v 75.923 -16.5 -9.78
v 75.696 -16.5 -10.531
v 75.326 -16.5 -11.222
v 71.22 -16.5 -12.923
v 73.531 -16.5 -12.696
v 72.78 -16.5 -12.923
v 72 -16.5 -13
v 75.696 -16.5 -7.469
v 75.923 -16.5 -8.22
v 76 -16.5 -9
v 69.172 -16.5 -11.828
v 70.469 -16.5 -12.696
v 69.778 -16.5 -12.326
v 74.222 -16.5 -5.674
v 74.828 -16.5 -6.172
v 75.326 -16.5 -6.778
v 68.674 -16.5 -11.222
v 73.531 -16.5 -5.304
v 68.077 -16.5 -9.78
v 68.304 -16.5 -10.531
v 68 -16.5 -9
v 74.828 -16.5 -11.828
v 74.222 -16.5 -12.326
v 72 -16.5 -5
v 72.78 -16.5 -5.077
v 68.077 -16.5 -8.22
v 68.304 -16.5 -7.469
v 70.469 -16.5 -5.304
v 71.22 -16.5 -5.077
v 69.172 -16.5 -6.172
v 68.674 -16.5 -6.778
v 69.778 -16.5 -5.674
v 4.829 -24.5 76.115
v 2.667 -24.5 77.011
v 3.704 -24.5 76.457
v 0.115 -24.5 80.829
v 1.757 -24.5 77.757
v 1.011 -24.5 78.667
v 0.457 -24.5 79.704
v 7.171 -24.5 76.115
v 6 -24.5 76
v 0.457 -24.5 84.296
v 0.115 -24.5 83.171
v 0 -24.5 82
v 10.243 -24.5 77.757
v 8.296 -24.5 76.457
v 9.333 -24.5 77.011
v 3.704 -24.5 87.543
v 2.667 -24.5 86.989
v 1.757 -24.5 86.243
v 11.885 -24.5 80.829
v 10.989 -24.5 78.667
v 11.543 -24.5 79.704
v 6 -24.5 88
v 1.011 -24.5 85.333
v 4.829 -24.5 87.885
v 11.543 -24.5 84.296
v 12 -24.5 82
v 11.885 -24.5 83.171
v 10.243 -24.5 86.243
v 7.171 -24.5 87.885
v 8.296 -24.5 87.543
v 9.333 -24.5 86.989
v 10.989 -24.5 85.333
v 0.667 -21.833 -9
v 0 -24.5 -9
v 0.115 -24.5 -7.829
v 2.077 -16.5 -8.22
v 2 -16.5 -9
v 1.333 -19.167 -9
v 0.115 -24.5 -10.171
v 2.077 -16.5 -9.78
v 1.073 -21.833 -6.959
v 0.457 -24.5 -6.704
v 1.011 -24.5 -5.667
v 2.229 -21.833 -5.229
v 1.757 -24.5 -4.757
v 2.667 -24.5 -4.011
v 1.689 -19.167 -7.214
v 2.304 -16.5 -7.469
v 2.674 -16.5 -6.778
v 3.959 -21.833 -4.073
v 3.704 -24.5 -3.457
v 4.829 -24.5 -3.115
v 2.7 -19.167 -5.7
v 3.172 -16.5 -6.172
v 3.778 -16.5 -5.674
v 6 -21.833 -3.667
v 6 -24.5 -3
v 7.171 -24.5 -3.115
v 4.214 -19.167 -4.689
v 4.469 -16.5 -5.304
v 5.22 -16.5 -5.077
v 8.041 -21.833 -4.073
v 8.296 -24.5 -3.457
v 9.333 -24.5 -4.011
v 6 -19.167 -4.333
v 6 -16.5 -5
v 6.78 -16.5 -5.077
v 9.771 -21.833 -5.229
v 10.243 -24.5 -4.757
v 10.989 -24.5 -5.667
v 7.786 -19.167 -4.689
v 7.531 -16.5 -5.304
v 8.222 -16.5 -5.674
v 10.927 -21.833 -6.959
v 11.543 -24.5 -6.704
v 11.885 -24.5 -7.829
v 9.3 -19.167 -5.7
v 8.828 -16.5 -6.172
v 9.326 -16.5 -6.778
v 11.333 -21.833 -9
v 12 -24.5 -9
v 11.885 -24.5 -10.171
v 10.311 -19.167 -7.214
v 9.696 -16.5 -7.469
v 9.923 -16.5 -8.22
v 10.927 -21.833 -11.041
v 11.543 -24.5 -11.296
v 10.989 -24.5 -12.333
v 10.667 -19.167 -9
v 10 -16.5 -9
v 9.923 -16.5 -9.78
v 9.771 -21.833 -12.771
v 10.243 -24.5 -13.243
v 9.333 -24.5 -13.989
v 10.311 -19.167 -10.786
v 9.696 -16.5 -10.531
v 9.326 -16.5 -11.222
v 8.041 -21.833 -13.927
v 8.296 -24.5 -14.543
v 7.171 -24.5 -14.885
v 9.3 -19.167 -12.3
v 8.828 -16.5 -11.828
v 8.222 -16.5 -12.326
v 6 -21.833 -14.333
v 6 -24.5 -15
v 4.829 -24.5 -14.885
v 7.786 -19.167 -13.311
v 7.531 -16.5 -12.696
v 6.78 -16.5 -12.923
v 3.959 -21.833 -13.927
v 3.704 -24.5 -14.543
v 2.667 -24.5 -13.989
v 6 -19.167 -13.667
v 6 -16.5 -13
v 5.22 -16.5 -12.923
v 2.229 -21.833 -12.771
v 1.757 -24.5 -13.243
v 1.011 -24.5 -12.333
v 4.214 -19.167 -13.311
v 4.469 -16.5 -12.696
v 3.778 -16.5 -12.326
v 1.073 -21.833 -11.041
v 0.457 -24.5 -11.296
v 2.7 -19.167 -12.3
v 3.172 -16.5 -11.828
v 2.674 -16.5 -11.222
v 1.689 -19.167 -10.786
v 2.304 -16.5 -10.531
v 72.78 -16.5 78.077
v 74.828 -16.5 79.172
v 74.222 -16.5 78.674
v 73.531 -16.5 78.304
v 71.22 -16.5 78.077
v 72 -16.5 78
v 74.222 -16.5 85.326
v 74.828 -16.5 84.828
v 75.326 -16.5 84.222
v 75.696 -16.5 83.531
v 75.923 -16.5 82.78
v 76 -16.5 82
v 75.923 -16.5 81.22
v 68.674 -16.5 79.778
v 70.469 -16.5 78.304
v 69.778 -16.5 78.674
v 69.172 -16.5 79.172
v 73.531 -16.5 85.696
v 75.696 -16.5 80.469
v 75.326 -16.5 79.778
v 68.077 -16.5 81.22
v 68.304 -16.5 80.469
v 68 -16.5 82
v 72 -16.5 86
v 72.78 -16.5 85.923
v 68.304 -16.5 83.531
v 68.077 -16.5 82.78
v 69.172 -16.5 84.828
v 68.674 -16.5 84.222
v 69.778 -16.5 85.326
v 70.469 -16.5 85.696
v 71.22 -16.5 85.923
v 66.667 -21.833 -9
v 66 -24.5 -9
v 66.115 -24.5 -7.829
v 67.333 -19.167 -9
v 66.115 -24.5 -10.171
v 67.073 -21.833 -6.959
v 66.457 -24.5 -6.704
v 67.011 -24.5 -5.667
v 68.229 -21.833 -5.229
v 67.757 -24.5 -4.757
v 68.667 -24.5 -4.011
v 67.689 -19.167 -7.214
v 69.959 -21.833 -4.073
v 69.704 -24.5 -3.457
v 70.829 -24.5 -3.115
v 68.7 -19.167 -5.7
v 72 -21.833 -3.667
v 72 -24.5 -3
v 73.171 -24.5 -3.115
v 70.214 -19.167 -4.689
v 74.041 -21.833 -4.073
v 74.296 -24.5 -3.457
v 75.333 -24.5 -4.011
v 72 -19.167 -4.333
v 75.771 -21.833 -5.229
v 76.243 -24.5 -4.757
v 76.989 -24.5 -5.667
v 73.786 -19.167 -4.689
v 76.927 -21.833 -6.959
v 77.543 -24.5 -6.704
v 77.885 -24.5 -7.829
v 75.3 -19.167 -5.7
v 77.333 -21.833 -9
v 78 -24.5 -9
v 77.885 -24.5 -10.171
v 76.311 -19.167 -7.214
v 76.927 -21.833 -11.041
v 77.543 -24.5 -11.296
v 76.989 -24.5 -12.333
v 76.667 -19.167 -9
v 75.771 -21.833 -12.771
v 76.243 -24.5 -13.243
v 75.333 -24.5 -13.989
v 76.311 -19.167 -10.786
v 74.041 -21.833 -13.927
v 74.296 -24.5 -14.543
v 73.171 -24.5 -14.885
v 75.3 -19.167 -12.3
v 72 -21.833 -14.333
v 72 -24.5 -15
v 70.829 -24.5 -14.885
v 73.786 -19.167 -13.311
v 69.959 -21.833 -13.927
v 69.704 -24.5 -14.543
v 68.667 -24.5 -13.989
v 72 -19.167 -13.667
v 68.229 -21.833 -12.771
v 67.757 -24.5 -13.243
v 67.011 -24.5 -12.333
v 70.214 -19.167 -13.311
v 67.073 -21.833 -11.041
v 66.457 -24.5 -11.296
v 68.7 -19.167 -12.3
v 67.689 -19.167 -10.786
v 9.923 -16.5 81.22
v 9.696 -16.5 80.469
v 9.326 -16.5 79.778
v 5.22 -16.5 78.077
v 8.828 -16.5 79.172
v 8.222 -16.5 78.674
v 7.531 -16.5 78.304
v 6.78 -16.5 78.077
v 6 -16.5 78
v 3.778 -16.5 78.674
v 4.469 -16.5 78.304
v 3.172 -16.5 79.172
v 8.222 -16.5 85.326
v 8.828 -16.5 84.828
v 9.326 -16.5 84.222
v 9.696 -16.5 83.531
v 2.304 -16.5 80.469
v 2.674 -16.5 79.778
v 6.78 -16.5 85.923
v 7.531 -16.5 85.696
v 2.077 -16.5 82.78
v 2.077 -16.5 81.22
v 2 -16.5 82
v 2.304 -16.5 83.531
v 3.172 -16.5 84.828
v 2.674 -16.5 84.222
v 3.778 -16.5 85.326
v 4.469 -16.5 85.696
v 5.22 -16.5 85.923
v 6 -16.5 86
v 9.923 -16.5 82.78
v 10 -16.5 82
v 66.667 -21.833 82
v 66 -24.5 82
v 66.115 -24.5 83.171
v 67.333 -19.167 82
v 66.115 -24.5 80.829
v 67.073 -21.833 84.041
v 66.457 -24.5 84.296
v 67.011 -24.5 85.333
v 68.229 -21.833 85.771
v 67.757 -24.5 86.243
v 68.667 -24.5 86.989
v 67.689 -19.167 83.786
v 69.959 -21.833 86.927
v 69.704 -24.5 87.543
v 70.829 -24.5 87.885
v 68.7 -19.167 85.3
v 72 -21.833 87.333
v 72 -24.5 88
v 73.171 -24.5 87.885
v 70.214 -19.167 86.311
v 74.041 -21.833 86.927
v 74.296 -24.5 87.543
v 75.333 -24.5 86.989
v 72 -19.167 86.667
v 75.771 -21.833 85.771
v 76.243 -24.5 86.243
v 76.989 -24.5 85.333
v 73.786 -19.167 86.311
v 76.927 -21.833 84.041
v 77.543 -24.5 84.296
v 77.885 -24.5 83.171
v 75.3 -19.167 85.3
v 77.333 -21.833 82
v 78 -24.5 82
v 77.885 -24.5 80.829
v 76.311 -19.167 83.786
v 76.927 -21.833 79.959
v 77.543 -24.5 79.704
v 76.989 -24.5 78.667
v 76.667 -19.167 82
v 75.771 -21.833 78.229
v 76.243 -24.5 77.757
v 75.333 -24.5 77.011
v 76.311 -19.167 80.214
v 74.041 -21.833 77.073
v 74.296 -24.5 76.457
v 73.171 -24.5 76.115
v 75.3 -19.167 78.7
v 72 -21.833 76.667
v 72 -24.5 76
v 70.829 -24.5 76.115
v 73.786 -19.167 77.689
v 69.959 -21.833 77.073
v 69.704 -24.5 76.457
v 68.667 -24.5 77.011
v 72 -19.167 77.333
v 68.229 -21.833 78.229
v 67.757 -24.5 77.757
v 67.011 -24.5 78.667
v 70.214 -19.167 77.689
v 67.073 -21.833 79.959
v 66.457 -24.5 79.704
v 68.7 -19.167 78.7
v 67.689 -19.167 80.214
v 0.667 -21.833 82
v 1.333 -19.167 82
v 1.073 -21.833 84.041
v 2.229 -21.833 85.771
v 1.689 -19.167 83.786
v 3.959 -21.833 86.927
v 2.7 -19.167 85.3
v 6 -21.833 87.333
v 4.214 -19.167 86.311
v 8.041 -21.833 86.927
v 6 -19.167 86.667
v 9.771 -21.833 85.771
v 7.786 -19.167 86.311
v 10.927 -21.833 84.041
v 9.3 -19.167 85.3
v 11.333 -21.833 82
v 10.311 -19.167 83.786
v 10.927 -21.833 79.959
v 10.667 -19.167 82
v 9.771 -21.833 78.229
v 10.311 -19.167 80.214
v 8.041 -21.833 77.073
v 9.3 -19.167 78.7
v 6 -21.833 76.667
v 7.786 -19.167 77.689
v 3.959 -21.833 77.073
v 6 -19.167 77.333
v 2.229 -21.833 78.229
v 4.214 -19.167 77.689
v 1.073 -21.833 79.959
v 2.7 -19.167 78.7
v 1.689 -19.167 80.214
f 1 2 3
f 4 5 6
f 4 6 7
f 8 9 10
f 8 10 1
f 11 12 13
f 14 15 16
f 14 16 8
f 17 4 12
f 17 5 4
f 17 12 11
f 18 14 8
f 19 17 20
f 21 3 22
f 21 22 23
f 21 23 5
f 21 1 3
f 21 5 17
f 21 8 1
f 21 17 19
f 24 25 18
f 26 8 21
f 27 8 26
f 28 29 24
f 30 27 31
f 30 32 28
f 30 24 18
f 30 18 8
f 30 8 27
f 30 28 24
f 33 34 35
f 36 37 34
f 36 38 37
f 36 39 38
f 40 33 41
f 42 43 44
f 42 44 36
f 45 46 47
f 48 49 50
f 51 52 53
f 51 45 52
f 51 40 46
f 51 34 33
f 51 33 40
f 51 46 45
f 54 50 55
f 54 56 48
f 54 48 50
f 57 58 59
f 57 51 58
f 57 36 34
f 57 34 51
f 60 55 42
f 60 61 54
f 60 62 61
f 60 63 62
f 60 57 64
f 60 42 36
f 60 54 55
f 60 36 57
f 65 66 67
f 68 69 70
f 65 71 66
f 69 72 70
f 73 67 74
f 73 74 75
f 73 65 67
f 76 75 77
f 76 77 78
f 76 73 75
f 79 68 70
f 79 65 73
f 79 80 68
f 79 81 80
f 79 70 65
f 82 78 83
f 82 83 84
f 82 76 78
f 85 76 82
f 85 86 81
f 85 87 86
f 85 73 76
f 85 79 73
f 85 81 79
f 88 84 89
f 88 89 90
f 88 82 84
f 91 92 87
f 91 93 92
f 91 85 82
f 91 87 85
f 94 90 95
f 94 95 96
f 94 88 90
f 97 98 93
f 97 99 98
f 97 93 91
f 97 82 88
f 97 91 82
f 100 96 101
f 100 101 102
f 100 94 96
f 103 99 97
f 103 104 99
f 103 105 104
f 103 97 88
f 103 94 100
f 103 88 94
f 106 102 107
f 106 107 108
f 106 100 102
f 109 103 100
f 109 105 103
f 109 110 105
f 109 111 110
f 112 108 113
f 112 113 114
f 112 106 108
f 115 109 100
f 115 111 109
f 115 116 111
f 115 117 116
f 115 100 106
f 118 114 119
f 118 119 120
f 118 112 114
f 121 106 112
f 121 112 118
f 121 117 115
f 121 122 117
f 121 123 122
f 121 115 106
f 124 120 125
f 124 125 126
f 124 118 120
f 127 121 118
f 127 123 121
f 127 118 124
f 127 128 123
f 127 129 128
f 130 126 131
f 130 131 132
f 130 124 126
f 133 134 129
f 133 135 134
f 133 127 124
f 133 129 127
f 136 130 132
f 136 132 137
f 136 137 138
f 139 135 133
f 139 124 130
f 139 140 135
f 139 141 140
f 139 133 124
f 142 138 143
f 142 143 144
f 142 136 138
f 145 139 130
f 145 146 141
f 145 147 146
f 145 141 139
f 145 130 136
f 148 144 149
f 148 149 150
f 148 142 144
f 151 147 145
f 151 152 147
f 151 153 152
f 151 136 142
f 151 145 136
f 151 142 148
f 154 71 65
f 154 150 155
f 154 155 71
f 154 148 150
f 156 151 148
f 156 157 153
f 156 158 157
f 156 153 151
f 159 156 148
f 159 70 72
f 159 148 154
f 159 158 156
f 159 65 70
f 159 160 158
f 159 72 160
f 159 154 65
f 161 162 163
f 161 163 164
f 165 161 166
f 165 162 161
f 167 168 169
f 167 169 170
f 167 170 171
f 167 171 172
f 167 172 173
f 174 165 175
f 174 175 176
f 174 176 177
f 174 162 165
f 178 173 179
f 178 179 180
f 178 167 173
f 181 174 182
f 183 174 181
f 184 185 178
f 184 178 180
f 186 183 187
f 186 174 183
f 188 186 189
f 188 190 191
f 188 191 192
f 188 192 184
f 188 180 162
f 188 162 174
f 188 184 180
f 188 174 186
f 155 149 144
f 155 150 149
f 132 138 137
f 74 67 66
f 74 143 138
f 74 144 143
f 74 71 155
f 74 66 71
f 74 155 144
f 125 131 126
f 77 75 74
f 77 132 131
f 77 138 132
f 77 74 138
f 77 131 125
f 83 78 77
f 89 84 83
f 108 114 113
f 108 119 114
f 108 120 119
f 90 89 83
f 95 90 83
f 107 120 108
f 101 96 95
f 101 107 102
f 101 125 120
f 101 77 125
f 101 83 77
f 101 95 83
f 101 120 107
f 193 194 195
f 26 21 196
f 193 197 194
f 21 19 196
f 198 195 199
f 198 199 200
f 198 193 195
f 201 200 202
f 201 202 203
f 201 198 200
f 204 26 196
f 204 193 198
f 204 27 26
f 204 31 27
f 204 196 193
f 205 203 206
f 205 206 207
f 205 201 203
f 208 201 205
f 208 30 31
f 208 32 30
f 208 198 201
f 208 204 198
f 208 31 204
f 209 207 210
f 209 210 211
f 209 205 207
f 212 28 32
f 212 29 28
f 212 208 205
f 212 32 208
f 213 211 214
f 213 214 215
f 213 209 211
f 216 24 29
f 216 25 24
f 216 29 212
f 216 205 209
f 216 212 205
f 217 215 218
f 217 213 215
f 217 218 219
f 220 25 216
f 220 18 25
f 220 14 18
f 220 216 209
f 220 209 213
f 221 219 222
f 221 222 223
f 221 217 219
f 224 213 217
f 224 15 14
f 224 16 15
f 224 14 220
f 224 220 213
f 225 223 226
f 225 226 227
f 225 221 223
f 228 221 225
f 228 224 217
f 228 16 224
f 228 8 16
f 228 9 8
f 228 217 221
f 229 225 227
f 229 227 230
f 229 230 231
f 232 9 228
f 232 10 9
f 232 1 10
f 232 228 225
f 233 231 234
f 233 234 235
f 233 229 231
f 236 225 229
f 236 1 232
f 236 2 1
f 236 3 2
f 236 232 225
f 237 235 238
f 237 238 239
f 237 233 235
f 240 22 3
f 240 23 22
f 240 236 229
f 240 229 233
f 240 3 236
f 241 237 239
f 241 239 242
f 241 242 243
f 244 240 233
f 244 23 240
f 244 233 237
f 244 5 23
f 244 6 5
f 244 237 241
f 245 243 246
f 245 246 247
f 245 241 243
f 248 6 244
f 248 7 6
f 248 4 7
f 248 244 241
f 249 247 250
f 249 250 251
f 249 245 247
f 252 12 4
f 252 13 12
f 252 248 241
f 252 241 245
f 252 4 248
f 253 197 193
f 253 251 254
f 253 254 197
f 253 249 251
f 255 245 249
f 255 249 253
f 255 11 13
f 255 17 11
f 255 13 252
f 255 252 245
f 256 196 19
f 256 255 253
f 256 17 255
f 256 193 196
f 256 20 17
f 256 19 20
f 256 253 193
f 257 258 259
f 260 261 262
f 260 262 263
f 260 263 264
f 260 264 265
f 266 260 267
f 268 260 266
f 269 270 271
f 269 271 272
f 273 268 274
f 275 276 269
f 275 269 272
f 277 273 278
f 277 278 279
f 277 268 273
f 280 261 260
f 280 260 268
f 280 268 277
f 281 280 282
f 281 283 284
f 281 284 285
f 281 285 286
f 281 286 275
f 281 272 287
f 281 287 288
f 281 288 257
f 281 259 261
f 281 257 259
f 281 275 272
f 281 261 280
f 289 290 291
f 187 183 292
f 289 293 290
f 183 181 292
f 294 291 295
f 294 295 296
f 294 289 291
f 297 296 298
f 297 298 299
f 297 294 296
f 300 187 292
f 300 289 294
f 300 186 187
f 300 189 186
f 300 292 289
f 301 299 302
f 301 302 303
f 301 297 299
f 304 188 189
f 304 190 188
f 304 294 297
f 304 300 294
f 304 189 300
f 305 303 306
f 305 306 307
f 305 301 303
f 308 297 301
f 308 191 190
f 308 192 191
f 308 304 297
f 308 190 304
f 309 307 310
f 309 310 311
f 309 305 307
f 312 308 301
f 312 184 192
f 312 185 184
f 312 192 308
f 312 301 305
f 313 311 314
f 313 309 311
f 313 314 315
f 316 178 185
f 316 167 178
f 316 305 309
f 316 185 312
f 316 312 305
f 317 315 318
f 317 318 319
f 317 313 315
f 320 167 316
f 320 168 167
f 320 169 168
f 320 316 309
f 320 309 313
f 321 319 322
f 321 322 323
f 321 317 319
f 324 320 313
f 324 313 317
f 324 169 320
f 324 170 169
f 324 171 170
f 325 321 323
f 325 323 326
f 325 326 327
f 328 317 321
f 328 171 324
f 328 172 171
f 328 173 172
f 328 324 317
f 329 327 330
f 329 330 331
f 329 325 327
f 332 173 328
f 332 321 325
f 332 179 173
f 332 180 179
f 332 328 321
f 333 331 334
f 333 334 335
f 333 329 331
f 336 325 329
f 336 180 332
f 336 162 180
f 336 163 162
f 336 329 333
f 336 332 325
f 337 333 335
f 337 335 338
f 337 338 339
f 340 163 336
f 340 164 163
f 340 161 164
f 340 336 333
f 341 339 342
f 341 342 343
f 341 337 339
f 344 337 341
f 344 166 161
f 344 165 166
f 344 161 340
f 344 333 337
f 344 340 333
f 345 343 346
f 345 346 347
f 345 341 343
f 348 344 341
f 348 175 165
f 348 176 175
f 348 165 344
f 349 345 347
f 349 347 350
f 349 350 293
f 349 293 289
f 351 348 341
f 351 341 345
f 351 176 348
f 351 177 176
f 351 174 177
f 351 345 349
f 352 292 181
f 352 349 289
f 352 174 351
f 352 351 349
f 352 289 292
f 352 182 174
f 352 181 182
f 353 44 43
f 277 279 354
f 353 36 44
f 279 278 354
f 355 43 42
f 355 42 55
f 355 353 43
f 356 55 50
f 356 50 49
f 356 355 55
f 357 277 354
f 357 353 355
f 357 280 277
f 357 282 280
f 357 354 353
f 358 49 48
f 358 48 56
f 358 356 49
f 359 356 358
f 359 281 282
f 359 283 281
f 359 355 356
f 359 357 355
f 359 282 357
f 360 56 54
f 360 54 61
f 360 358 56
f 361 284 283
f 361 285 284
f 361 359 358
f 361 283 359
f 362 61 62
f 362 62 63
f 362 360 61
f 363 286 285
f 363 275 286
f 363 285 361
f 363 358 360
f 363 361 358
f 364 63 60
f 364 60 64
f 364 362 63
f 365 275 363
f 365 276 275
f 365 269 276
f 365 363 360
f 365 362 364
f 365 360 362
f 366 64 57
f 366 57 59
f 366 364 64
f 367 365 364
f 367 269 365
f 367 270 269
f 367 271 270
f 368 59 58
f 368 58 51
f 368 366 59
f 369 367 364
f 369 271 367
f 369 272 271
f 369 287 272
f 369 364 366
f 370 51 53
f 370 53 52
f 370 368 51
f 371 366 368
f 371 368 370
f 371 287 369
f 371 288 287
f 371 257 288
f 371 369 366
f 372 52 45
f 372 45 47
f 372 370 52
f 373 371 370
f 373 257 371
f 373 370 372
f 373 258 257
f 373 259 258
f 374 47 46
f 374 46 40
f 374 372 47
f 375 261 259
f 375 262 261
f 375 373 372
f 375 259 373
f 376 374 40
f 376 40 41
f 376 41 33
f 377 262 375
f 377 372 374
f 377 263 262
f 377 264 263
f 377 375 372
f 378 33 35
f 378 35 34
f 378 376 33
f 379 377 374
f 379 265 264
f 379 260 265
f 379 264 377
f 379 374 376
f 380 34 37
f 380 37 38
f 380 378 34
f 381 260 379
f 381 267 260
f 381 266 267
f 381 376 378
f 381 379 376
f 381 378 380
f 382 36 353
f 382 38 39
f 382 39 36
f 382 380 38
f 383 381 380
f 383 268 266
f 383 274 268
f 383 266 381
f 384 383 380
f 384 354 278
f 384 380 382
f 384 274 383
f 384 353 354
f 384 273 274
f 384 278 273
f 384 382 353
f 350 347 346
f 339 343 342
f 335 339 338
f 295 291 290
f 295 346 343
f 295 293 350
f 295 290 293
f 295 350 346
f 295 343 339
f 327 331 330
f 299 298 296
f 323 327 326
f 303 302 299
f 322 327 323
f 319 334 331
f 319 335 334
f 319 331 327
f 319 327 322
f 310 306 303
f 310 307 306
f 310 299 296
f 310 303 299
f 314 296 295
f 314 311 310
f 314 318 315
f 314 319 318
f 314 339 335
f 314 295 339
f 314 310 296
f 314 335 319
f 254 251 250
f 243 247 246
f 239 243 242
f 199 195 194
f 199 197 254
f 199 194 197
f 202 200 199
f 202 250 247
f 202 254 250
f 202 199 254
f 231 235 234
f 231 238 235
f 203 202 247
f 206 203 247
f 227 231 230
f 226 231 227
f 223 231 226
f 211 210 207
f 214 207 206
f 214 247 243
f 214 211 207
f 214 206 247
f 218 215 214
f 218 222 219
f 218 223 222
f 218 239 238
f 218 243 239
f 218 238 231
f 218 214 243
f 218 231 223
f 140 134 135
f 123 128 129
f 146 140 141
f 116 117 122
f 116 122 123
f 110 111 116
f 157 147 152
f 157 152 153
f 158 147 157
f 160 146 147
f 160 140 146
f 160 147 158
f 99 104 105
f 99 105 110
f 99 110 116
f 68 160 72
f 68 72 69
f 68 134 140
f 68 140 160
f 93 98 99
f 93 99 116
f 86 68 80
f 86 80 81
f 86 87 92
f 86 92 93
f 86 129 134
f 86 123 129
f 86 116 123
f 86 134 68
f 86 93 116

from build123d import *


with BuildPart() as cone002:
    # Cone002 → Cone002 (revolve)
    with BuildSketch(Plane(origin=(6, -24.5, 82), x_dir=(-1, 0, 0), z_dir=(0, 0, -1))):
        Polygon((0, 0), (6, 0), (4, 8), (0, 8), align=None)
    revolve(axis=Axis((6, -24.5, 82), (0, 1, 0)))


with BuildPart() as cone003:
    # Cone003 → Cone003 (revolve)
    with BuildSketch(Plane(origin=(72, -24.5, -9), x_dir=(-1, 0, 0), z_dir=(0, 0, -1))):
        Polygon((0, 0), (6, 0), (4, 8), (0, 8), align=None)
    revolve(axis=Axis((72, -24.5, -9), (0, 1, 0)))


with BuildPart() as cone004:
    # Cone004 → Cone004 (revolve)
    with BuildSketch(Plane(origin=(72, -24.5, 82), x_dir=(-1, 0, 0), z_dir=(0, 0, -1))):
        Polygon((0, 0), (6, 0), (4, 8), (0, 8), align=None)
    revolve(axis=Axis((72, -24.5, 82), (0, 1, 0)))


with BuildPart() as m3nutsholds:
    # Cone001 → Cone001 (revolve)
    with BuildSketch(Plane(origin=(6, -24.5, -9), x_dir=(-1, 0, 0), z_dir=(0, 0, -1))):
        Polygon((0, 0), (6, 0), (4, 8), (0, 8), align=None)
    revolve(axis=Axis((6, -24.5, -9), (0, 1, 0)))

    # Fusion043: union Cone002, Cone003, Cone004
    add(cone002.part)
    add(cone003.part)
    add(cone004.part)


solid = m3nutsholds.part
